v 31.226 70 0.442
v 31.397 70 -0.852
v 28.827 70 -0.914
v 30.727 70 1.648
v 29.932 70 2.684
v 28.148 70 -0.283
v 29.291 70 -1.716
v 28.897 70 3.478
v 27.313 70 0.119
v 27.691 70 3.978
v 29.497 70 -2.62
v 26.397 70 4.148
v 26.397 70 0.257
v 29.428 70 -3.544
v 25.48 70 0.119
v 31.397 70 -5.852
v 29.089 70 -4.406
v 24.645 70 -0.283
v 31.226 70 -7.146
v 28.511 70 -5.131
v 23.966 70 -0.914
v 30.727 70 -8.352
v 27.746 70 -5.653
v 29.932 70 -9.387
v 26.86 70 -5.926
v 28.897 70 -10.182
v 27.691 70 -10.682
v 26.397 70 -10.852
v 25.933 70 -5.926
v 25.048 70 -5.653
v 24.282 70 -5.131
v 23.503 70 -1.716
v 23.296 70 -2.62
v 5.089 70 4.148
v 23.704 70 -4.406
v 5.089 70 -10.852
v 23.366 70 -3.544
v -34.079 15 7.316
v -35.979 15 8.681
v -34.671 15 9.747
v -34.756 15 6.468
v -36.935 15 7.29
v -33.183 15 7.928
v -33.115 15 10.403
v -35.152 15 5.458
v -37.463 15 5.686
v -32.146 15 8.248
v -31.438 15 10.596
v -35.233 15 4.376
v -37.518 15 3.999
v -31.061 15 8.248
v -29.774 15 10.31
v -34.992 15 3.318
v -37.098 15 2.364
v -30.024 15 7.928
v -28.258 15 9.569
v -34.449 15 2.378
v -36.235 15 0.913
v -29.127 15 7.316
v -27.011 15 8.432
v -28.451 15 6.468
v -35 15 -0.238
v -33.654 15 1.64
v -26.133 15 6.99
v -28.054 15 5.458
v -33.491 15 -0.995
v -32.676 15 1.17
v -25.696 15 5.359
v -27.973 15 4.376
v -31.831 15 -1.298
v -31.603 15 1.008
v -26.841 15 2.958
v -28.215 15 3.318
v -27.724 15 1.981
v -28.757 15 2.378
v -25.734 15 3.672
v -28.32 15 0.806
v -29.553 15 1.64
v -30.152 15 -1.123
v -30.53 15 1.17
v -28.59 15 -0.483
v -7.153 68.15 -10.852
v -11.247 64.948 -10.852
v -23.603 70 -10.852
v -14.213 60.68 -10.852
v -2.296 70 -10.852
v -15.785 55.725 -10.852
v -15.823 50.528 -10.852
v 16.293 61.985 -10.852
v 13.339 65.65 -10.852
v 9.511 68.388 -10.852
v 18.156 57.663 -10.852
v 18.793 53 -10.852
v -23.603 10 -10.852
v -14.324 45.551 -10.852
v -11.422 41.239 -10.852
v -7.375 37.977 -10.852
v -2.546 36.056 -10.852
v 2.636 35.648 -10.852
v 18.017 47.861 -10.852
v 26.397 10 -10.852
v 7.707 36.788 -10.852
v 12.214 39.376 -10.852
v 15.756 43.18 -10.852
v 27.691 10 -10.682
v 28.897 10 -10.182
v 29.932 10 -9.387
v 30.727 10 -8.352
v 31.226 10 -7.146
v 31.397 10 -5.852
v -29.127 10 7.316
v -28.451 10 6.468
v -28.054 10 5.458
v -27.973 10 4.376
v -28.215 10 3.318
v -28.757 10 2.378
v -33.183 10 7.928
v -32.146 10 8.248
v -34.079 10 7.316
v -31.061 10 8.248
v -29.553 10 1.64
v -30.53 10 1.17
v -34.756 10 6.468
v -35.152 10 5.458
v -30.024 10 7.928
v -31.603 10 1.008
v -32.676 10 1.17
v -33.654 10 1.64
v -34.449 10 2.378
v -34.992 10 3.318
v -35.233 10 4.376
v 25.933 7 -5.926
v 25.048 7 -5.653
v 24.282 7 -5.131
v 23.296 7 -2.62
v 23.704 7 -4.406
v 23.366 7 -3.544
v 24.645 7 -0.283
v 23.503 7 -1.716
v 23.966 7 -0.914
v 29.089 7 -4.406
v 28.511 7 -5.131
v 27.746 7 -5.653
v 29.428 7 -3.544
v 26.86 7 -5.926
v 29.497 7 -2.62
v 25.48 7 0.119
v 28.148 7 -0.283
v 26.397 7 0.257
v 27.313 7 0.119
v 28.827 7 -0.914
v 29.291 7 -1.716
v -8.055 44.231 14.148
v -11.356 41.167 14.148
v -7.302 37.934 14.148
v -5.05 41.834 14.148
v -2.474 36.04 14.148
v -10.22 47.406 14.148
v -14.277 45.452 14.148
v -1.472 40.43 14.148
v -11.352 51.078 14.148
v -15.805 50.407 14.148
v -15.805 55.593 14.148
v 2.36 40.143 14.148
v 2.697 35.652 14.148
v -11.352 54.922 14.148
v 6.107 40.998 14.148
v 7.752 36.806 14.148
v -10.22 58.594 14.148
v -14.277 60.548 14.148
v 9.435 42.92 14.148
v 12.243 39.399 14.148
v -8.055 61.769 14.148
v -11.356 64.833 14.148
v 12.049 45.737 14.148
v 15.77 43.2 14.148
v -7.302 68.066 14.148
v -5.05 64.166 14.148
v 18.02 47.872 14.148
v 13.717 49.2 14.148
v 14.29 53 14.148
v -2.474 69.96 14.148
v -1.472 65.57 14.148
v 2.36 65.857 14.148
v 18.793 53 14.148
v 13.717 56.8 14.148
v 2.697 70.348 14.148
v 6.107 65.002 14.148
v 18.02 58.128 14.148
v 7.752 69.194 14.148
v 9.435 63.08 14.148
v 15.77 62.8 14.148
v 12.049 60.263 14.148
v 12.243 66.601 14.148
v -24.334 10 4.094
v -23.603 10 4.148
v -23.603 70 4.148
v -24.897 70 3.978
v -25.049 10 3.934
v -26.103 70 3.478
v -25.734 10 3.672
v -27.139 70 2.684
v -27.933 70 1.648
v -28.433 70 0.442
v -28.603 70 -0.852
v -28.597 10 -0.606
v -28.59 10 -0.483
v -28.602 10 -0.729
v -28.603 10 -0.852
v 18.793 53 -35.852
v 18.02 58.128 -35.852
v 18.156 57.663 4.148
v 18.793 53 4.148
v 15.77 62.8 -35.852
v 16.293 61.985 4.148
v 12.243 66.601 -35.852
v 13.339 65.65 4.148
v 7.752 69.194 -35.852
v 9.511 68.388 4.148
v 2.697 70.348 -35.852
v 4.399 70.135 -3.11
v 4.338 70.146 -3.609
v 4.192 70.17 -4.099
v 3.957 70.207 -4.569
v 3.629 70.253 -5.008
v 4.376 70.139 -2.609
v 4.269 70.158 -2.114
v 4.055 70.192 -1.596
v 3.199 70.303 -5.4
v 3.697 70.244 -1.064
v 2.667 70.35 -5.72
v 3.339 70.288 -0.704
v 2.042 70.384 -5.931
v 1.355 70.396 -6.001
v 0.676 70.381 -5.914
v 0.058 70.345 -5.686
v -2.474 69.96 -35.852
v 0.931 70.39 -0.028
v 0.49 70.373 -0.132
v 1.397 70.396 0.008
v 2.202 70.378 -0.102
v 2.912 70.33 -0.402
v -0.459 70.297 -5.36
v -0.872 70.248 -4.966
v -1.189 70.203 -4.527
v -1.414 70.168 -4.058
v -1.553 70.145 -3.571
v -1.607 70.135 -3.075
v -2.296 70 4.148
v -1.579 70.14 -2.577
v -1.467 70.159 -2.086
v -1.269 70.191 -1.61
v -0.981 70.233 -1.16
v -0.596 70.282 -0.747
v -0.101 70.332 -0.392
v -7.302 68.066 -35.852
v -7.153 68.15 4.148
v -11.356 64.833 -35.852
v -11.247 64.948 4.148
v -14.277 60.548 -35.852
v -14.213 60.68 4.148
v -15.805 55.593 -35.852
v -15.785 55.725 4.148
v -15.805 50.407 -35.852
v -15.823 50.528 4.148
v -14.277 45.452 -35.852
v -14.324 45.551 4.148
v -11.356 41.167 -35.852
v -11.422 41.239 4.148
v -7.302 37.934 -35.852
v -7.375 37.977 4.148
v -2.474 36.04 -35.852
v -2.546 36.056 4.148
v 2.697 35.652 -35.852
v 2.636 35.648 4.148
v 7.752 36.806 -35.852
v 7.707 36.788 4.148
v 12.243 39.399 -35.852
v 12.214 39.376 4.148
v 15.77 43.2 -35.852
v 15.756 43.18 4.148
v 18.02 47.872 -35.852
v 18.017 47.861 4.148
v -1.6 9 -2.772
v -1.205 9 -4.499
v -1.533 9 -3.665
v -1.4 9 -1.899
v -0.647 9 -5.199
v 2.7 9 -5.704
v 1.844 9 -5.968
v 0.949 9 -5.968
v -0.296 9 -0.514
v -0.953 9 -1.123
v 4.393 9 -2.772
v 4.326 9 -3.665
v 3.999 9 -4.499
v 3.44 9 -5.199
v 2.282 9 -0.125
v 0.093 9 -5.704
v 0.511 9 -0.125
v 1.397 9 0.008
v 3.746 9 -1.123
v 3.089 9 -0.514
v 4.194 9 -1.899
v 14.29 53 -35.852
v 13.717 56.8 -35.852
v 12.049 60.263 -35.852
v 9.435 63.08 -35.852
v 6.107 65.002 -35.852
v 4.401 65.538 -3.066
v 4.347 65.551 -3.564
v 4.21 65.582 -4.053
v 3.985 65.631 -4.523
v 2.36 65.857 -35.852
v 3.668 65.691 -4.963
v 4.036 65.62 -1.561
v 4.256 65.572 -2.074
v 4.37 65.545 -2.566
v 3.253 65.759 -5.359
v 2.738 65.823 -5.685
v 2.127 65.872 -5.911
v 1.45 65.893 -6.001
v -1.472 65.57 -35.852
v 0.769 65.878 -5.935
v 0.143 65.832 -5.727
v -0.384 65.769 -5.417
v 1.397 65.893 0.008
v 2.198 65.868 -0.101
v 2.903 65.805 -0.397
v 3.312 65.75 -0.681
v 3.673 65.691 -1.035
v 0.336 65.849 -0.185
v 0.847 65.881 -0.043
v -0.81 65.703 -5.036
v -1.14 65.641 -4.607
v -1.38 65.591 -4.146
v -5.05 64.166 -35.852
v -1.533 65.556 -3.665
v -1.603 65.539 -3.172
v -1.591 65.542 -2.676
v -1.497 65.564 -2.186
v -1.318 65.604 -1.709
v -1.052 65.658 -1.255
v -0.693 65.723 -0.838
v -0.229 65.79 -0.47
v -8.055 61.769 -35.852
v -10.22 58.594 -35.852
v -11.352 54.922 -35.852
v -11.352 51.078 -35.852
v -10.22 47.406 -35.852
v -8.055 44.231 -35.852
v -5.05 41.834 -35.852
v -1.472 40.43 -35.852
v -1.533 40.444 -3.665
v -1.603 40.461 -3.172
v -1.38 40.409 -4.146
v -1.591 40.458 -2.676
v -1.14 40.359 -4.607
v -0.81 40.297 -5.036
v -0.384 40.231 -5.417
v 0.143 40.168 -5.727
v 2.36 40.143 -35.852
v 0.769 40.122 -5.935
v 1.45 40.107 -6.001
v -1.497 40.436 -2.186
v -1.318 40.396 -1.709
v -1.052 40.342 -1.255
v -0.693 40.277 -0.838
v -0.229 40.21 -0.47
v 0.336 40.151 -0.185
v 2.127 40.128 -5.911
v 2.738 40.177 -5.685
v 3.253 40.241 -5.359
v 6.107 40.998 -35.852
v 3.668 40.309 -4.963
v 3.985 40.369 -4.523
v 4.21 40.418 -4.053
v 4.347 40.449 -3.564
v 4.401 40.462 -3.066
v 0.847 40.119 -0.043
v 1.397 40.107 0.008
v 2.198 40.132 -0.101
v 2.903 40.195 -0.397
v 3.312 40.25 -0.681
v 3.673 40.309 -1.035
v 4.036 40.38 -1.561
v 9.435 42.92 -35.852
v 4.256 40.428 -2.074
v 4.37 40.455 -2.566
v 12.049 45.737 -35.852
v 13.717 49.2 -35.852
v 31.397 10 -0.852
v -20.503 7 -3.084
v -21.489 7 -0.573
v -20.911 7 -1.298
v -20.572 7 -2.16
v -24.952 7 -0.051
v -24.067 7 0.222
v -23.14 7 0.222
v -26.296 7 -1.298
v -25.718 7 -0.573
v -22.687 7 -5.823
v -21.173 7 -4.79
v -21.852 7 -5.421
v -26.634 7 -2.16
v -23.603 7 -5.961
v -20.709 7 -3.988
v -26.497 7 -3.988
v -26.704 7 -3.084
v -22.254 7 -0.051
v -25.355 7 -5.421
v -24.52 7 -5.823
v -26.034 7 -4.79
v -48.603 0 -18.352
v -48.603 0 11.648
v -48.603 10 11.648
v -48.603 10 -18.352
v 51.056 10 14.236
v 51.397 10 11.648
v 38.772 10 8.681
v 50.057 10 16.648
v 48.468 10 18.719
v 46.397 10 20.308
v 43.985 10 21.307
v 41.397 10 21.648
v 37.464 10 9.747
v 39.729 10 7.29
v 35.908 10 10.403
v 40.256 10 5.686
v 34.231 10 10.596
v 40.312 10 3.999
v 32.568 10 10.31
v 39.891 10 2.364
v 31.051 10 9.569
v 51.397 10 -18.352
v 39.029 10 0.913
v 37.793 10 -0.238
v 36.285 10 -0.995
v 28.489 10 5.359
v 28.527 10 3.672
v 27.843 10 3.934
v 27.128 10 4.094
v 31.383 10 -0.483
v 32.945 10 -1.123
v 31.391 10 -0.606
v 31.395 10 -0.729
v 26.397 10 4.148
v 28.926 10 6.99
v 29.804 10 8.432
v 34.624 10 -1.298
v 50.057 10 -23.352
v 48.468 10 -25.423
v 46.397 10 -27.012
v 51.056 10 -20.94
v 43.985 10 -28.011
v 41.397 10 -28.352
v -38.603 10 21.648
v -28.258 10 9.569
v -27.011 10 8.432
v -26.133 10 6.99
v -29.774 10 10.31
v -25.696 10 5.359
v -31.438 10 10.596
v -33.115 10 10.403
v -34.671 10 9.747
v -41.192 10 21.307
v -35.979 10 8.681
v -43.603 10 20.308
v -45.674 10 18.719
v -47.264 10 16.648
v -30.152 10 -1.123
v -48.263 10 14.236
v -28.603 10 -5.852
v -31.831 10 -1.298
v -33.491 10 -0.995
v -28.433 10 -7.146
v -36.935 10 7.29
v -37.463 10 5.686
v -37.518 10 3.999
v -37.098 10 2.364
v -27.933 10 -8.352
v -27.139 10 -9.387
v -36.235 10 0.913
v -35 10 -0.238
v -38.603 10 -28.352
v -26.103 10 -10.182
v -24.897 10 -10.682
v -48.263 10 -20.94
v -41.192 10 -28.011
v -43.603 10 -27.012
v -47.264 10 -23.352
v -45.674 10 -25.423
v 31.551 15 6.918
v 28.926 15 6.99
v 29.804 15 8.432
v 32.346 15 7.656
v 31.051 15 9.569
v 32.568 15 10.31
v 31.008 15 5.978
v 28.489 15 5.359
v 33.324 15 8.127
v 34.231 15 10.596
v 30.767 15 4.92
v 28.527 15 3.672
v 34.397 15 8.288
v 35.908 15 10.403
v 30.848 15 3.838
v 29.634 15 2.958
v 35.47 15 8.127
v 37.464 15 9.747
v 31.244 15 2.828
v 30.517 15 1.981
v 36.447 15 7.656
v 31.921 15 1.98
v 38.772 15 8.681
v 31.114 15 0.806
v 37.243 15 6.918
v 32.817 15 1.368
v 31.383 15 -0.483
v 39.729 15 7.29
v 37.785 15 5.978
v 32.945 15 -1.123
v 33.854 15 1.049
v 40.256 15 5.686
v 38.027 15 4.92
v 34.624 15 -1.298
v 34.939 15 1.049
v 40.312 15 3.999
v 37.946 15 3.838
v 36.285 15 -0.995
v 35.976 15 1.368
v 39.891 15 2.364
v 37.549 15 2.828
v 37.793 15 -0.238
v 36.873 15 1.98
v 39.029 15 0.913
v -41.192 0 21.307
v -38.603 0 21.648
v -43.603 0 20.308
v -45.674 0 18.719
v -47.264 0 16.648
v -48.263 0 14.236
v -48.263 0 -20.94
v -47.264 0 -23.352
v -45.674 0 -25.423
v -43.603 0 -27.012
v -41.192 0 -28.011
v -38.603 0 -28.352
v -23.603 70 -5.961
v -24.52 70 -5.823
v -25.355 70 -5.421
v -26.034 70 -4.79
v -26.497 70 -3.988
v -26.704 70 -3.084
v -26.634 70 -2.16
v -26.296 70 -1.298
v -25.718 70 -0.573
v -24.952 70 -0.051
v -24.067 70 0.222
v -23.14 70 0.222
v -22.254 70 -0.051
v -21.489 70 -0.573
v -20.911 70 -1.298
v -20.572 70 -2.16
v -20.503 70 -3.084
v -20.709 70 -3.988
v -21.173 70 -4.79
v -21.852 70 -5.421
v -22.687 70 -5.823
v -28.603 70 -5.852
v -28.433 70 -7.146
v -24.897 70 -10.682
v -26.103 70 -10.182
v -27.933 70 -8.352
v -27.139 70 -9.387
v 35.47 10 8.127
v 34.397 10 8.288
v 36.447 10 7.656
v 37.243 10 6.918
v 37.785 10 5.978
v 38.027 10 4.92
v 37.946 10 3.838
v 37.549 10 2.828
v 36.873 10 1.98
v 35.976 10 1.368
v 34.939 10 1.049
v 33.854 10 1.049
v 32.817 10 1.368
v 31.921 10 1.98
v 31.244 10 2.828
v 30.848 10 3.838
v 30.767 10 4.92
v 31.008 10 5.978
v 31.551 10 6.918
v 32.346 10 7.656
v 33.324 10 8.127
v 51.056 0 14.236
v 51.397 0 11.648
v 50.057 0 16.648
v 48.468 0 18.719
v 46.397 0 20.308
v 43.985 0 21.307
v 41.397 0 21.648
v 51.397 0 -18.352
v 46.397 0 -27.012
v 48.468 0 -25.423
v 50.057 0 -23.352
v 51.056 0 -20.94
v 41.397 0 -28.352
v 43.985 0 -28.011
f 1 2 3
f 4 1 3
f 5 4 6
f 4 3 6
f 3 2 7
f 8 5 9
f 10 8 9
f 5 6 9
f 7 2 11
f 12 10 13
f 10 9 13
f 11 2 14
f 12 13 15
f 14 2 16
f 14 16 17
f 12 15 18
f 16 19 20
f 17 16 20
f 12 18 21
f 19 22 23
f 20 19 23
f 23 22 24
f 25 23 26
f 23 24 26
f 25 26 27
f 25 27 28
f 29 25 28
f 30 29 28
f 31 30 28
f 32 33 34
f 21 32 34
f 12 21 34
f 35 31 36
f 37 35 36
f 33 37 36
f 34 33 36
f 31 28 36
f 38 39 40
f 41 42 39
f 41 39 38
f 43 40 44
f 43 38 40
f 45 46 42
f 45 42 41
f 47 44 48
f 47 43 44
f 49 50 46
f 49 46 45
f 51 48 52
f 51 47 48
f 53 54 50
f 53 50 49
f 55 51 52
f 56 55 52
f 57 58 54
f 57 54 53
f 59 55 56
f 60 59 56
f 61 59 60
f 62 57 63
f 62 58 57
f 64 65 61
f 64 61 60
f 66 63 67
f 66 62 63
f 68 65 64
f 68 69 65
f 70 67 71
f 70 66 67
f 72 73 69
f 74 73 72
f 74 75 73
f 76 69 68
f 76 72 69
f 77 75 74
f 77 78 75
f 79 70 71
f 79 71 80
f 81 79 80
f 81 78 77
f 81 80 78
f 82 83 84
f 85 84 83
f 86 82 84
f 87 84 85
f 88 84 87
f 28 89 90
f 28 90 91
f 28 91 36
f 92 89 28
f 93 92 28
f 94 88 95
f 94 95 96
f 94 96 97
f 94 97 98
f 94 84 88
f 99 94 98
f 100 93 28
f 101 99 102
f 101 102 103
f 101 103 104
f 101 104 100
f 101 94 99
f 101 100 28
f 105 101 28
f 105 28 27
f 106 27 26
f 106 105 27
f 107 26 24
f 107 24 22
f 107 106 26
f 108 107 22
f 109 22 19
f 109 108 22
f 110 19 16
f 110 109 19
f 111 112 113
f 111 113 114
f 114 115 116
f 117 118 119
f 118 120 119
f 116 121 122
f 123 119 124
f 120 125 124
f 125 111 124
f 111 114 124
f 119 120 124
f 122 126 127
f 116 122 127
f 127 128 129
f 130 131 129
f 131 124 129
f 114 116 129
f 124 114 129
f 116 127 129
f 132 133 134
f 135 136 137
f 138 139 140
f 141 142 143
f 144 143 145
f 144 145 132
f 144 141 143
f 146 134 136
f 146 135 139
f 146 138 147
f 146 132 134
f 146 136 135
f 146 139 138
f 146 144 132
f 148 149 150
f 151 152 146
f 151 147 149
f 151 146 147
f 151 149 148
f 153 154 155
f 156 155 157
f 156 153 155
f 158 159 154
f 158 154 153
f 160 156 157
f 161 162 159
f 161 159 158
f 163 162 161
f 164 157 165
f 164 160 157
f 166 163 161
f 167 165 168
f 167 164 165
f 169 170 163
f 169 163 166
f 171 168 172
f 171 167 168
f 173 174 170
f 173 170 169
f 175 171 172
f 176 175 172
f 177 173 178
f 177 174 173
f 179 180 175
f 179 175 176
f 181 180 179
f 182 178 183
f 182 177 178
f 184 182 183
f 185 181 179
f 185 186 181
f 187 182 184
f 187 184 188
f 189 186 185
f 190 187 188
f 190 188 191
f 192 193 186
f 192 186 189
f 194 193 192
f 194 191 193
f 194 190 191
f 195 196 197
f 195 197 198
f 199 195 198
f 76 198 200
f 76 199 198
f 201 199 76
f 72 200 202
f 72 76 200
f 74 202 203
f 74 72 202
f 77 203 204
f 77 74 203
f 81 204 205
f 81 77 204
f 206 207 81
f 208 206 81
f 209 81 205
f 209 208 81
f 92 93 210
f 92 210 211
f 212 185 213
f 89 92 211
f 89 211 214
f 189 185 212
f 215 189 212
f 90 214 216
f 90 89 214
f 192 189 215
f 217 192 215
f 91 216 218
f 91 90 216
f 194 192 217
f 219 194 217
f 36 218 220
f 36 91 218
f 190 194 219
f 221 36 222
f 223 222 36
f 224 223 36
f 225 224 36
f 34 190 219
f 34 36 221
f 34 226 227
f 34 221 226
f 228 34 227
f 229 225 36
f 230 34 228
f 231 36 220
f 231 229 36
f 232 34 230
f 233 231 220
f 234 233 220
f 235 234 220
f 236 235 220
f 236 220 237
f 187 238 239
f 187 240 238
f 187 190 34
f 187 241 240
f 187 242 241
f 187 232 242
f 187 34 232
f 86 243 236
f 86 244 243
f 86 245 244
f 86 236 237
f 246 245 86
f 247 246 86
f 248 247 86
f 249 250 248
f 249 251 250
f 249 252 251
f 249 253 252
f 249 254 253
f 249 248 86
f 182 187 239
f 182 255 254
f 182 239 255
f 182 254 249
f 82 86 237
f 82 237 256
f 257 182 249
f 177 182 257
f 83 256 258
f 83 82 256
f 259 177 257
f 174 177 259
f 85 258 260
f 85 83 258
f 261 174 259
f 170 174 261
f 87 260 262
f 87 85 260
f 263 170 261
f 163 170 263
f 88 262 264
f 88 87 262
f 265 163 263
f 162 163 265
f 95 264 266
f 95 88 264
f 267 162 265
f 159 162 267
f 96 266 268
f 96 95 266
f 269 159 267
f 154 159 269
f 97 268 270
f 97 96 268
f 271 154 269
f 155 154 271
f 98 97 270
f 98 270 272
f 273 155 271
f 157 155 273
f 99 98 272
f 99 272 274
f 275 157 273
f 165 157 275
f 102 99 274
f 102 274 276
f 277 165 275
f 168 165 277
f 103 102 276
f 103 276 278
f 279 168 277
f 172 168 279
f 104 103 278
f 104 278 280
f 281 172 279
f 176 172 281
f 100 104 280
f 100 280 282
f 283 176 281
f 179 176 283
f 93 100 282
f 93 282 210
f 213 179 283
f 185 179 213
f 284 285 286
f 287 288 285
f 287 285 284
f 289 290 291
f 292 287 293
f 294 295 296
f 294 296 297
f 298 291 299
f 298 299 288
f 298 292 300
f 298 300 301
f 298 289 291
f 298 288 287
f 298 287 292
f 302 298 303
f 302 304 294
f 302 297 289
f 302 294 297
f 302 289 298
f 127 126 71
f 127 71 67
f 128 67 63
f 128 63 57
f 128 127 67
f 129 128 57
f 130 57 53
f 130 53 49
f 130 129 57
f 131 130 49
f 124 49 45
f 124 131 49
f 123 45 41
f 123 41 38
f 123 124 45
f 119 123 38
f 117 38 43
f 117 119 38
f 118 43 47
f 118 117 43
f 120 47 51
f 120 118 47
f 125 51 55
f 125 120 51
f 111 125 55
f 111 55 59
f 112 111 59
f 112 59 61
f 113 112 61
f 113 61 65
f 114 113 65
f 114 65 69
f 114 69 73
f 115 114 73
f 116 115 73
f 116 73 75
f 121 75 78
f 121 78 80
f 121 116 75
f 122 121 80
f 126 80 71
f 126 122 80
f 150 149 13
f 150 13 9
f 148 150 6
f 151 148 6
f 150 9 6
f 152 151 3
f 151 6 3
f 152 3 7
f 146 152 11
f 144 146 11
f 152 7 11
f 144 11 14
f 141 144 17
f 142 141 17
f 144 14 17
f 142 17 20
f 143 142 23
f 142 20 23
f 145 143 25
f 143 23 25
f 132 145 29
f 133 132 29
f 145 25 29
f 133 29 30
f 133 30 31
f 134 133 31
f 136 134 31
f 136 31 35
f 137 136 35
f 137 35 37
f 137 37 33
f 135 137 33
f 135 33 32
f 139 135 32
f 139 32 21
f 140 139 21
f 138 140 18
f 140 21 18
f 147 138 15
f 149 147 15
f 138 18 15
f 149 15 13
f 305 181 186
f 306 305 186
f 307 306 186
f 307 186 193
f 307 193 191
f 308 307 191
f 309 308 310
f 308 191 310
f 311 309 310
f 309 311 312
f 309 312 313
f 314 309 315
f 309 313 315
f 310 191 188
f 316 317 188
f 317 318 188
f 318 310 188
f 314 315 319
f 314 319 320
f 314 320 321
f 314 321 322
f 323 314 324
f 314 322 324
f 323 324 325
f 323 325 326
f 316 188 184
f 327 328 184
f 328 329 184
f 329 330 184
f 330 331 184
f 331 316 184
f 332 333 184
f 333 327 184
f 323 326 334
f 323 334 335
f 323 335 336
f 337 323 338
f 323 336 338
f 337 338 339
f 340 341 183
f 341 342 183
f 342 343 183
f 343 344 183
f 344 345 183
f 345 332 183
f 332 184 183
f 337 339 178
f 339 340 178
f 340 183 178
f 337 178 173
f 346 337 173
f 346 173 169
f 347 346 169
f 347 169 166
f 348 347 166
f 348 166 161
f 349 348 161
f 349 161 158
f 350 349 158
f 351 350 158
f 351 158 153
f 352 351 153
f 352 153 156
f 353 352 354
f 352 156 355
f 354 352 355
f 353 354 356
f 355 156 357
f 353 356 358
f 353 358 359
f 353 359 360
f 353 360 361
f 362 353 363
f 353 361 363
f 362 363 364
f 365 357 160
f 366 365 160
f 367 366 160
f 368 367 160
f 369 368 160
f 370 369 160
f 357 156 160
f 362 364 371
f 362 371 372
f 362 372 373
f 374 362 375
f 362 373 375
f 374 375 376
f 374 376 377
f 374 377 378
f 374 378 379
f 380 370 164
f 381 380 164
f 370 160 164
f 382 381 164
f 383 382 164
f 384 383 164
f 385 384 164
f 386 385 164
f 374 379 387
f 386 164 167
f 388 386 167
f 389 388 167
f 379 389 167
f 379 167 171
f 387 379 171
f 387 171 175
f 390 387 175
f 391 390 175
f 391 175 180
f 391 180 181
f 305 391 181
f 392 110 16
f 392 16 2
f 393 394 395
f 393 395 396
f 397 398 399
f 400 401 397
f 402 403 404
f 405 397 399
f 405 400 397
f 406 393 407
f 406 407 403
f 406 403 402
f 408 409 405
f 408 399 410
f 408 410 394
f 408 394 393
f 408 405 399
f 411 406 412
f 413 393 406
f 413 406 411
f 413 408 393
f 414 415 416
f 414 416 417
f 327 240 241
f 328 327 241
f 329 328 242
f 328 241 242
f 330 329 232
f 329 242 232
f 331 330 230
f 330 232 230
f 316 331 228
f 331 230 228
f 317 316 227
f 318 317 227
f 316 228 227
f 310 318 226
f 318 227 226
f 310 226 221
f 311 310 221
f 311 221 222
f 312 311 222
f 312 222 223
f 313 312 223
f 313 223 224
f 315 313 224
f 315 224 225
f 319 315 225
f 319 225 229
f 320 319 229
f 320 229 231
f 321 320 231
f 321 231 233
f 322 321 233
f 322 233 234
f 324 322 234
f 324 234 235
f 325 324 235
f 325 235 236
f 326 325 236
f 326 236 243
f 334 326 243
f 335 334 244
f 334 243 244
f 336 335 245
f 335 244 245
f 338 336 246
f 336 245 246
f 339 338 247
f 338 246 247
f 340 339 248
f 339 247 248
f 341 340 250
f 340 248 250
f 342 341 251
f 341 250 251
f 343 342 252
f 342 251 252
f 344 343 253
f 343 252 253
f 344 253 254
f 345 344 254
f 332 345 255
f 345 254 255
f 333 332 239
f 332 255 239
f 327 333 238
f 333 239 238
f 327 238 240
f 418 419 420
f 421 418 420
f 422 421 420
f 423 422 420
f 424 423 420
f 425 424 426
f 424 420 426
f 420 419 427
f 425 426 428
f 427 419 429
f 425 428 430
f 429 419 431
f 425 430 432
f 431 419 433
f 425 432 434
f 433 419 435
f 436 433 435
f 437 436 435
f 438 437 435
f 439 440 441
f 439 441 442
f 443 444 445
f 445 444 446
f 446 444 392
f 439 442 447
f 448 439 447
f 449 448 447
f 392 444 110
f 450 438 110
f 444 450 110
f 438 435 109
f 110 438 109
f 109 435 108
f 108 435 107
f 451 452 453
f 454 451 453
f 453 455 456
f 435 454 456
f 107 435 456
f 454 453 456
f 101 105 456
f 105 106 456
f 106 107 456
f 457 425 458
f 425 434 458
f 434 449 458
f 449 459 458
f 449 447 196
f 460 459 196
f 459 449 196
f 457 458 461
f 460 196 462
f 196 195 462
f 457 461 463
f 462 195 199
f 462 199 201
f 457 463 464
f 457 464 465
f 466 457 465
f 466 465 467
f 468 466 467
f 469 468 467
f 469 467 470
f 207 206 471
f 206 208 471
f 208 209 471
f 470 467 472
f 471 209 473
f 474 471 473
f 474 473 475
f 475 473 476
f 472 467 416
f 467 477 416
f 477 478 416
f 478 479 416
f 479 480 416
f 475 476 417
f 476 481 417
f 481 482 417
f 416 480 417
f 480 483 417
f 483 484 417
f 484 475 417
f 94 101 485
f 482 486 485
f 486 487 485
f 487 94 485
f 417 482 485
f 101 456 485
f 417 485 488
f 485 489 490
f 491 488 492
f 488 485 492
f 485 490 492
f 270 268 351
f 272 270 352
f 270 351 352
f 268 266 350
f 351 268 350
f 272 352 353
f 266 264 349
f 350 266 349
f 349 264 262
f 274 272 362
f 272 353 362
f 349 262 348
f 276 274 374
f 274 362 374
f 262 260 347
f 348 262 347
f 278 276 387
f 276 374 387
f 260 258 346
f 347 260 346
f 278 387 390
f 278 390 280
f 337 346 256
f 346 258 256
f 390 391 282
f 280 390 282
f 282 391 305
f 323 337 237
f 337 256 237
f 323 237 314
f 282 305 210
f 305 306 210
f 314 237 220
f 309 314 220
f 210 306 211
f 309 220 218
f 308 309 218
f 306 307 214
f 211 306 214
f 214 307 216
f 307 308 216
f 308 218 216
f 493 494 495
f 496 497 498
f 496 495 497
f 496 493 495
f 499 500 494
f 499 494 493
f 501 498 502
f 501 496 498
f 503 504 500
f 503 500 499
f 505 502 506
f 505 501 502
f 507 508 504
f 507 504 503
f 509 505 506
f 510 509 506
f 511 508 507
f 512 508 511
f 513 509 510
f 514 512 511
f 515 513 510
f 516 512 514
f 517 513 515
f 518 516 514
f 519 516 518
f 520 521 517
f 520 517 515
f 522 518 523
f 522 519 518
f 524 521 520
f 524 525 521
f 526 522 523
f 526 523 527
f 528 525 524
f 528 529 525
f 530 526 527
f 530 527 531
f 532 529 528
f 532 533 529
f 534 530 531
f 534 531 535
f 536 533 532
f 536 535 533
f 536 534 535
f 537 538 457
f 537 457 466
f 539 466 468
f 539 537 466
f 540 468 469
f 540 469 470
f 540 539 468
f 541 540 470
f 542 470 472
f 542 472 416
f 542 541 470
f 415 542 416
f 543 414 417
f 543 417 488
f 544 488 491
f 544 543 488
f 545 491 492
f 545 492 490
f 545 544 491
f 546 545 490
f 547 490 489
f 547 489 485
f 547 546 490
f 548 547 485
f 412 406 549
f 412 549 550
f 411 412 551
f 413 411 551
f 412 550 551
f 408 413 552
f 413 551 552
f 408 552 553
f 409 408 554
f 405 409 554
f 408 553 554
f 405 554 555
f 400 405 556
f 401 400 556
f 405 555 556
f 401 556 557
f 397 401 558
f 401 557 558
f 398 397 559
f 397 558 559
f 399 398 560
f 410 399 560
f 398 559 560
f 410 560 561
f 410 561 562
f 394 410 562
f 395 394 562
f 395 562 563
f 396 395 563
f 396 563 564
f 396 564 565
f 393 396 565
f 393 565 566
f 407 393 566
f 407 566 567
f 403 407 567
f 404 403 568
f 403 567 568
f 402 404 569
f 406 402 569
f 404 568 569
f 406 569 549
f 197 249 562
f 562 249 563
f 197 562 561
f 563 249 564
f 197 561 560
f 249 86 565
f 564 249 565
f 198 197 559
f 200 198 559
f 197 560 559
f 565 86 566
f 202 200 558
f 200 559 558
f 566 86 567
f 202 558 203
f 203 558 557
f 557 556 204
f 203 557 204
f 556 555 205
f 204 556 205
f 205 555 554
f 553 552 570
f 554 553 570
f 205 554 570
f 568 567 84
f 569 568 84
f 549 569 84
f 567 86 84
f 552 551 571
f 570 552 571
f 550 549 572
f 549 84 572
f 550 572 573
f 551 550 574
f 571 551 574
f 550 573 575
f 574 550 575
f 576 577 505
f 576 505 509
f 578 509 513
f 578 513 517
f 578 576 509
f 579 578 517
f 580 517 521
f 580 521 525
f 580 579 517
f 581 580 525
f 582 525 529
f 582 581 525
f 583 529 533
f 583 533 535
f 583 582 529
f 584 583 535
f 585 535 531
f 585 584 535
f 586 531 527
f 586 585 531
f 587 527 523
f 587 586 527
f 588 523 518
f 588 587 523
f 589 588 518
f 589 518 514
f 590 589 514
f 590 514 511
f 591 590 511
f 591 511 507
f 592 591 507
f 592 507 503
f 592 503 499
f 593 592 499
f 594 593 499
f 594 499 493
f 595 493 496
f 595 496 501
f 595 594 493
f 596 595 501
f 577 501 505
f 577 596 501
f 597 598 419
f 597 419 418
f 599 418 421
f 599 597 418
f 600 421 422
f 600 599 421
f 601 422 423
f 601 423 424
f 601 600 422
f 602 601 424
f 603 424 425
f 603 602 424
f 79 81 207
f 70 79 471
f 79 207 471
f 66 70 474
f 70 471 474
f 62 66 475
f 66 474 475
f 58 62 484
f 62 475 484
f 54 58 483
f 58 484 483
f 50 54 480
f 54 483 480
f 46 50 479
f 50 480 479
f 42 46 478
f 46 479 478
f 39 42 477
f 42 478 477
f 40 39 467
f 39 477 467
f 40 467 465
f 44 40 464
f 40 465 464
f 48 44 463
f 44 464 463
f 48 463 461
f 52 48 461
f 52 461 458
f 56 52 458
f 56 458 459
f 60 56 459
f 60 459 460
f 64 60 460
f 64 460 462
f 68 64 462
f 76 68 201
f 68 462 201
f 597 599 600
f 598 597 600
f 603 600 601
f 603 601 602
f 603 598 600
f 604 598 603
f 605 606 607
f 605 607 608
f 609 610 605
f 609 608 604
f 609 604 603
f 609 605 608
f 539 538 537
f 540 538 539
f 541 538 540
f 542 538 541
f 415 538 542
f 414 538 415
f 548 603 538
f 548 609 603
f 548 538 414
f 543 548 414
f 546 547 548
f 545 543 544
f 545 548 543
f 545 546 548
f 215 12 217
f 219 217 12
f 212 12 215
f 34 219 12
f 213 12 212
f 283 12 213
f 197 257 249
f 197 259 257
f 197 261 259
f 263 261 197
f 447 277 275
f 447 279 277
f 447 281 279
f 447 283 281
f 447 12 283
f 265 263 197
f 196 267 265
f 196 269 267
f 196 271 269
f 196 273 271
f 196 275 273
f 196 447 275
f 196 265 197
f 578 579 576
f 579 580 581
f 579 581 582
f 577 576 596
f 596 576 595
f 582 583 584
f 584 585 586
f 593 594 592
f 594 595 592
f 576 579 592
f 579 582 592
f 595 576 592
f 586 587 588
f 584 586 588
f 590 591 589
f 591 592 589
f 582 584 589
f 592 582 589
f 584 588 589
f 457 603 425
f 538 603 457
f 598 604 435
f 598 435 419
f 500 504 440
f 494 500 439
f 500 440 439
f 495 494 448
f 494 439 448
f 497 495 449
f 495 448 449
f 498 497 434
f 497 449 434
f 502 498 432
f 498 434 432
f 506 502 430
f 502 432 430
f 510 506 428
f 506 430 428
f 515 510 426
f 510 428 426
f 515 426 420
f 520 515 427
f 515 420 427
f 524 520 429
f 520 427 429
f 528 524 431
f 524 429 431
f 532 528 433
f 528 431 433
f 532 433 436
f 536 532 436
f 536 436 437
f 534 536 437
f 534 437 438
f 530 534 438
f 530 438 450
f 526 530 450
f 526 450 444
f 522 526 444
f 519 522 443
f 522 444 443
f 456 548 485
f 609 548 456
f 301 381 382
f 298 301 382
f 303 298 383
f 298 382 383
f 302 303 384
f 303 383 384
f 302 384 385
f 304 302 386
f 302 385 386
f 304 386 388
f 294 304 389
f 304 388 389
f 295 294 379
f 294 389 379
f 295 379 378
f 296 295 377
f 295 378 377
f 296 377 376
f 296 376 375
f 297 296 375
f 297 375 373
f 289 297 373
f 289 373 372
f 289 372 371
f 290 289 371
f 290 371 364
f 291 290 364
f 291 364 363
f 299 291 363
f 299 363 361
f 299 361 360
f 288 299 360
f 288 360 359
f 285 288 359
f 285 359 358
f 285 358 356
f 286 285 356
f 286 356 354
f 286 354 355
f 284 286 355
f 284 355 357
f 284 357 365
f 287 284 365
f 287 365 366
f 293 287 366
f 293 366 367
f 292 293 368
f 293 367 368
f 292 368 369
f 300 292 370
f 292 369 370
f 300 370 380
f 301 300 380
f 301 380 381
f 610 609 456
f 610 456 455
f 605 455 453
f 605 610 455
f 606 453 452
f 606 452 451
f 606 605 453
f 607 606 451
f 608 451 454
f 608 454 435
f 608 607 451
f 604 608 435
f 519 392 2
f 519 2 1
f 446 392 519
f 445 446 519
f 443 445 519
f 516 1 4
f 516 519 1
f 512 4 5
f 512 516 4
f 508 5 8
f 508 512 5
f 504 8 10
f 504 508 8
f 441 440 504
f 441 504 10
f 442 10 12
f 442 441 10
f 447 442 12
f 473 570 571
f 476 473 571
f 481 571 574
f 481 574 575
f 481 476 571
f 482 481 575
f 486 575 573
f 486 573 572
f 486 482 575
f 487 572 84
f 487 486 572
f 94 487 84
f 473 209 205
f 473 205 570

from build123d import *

# Parameters (mm, degrees)
BOSS_EXTRUDE2_DEPTH = 10
BOSS_EXTRUDE4_DEPTH = 60
SKETCH4_R           = 5.950427228
SKETCH4_R_2         = 3.640178542
BOSS_EXTRUDE5_DEPTH = 5
SKETCH9_R           = 17.396356036
SKETCH9_R_2         = 12.893034815
BOSS_EXTRUDE7_DEPTH = 50
SKETCH11_R          = 12.893034815
CUT_EXTRUDE2_DEPTH  = 96.902358539
SKETCH12_R          = 3.108842341
CUT_EXTRUDE5_DEPTH  = 63
SKETCH16_R          = 3.004688719
CUT_EXTRUDE6_DEPTH  = 66


with BuildPart() as part:
    # Sketch1 → Boss-Extrude2 (new body)
    with BuildSketch(Plane(origin=(0, 0, 0), x_dir=(1, 0, 0), z_dir=(0, 1, 0))):
        with BuildLine():
            Line((-38.603351955, 28.351955307), (41.396648045, 28.351955307))
            ThreePointArc((41.396648045, 28.351955307), (48.467715857, 25.423023119), (51.396648045, 18.351955307))
            Line((51.396648045, 18.351955307), (51.396648045, -11.648044693))
            ThreePointArc((51.396648045, -11.648044693), (48.467715857, -18.719112505), (41.396648045, -21.648044693))
            Line((41.396648045, -21.648044693), (-38.603351955, -21.648044693))
            ThreePointArc((-38.603351955, -21.648044693), (-45.674419767, -18.719112505), (-48.603351955, -11.648044693))
            Line((-48.603351955, -11.648044693), (-48.603351955, 18.351955307))
            ThreePointArc((-48.603351955, 18.351955307), (-45.674419767, 25.423023119), (-38.603351955, 28.351955307))
        make_face()
    extrude(amount=BOSS_EXTRUDE2_DEPTH)

    # Sketch3 → Boss-Extrude4 (add)
    with BuildSketch(Plane(origin=(0, 10, 0), x_dir=(1, 0, 0), z_dir=(0, 1, 0))):
        with BuildLine():
            Line((-23.603351955, 10.851955307), (26.396648045, 10.851955307))
            ThreePointArc((26.396648045, 10.851955307), (29.932181951, 9.387489213), (31.396648045, 5.851955307))
            Line((31.396648045, 5.851955307), (31.396648045, 0.851955307))
            ThreePointArc((31.396648045, 0.851955307), (29.932181951, -2.683578599), (26.396648045, -4.148044693))
            Line((26.396648045, -4.148044693), (-23.603351955, -4.148044693))
            ThreePointArc((-23.603351955, -4.148044693), (-27.138885861, -2.683578599), (-28.603351955, 0.851955307))
            Line((-28.603351955, 0.851955307), (-28.603351955, 5.851955307))
            ThreePointArc((-28.603351955, 5.851955307), (-27.138885861, 9.387489213), (-23.603351955, 10.851955307))
        make_face()
    extrude(amount=BOSS_EXTRUDE4_DEPTH)

    # Sketch4 → Boss-Extrude5 (add)
    # profile 1 of 2: a face of its own
    with BuildSketch(Plane(origin=(0, 10, 0), x_dir=(1, 0, 0), z_dir=(0, 1, 0))):
        with Locations((34.396648045, -4.648044693)):
            Circle(SKETCH4_R)
        with Locations(Location((34.396648045, -4.648044693, 0), (0, 0, 270))):
            Circle(SKETCH4_R_2, mode=Mode.SUBTRACT)
    # profile 2 of 2: a face of its own
    with BuildSketch(Plane(origin=(0, 10, 0), x_dir=(1, 0, 0), z_dir=(0, 1, 0))):
        with Locations((-31.603351955, -4.648044693)):
            Circle(SKETCH4_R)
        with Locations(Location((-31.603351955, -4.648044693, 0), (0, 0, 90))):
            Circle(SKETCH4_R_2, mode=Mode.SUBTRACT)
    extrude(amount=BOSS_EXTRUDE5_DEPTH)

    # Sketch9 → Boss-Extrude7 (add)
    with BuildSketch(Plane.XY.offset(14.148044693)):
        with Locations((1.396648045, 53)):
            Circle(SKETCH9_R)
        with Locations((1.396648045, 53)):
            Circle(SKETCH9_R_2, mode=Mode.SUBTRACT)
    extrude(amount=-BOSS_EXTRUDE7_DEPTH)

    # Sketch11 → Cut-Extrude2 (cut, through all)
    with BuildSketch(Plane.XY.offset(4.148044693)):
        with Locations((1.396648045, 53)):
            Circle(SKETCH11_R)
    extrude(amount=-CUT_EXTRUDE2_DEPTH, mode=Mode.SUBTRACT)

    # Sketch12 → Cut-Extrude5 (cut)
    with BuildSketch(Plane(origin=(0, 70, 0), x_dir=(1, 0, 0), z_dir=(0, 1, 0))):
        with Locations(Location((26.396648045, 2.851955307, 0), (0, 0, 270))):
            Circle(SKETCH12_R)
        with Locations(Location((-23.603351955, 2.851955307, 0), (0, 0, 90))):
            Circle(SKETCH12_R)
    extrude(amount=-CUT_EXTRUDE5_DEPTH, mode=Mode.SUBTRACT)

    # Sketch16 → Cut-Extrude6 (cut)
    with BuildSketch(Plane(origin=(0, 75, 0), x_dir=(1, 0, 0), z_dir=(0, 1, 0))):
        with Locations(Location((1.396648045, 2.996607423, 0), (0, 0, 270))):
            Circle(SKETCH16_R)
    extrude(amount=-CUT_EXTRUDE6_DEPTH, mode=Mode.SUBTRACT)


solid = part.part
